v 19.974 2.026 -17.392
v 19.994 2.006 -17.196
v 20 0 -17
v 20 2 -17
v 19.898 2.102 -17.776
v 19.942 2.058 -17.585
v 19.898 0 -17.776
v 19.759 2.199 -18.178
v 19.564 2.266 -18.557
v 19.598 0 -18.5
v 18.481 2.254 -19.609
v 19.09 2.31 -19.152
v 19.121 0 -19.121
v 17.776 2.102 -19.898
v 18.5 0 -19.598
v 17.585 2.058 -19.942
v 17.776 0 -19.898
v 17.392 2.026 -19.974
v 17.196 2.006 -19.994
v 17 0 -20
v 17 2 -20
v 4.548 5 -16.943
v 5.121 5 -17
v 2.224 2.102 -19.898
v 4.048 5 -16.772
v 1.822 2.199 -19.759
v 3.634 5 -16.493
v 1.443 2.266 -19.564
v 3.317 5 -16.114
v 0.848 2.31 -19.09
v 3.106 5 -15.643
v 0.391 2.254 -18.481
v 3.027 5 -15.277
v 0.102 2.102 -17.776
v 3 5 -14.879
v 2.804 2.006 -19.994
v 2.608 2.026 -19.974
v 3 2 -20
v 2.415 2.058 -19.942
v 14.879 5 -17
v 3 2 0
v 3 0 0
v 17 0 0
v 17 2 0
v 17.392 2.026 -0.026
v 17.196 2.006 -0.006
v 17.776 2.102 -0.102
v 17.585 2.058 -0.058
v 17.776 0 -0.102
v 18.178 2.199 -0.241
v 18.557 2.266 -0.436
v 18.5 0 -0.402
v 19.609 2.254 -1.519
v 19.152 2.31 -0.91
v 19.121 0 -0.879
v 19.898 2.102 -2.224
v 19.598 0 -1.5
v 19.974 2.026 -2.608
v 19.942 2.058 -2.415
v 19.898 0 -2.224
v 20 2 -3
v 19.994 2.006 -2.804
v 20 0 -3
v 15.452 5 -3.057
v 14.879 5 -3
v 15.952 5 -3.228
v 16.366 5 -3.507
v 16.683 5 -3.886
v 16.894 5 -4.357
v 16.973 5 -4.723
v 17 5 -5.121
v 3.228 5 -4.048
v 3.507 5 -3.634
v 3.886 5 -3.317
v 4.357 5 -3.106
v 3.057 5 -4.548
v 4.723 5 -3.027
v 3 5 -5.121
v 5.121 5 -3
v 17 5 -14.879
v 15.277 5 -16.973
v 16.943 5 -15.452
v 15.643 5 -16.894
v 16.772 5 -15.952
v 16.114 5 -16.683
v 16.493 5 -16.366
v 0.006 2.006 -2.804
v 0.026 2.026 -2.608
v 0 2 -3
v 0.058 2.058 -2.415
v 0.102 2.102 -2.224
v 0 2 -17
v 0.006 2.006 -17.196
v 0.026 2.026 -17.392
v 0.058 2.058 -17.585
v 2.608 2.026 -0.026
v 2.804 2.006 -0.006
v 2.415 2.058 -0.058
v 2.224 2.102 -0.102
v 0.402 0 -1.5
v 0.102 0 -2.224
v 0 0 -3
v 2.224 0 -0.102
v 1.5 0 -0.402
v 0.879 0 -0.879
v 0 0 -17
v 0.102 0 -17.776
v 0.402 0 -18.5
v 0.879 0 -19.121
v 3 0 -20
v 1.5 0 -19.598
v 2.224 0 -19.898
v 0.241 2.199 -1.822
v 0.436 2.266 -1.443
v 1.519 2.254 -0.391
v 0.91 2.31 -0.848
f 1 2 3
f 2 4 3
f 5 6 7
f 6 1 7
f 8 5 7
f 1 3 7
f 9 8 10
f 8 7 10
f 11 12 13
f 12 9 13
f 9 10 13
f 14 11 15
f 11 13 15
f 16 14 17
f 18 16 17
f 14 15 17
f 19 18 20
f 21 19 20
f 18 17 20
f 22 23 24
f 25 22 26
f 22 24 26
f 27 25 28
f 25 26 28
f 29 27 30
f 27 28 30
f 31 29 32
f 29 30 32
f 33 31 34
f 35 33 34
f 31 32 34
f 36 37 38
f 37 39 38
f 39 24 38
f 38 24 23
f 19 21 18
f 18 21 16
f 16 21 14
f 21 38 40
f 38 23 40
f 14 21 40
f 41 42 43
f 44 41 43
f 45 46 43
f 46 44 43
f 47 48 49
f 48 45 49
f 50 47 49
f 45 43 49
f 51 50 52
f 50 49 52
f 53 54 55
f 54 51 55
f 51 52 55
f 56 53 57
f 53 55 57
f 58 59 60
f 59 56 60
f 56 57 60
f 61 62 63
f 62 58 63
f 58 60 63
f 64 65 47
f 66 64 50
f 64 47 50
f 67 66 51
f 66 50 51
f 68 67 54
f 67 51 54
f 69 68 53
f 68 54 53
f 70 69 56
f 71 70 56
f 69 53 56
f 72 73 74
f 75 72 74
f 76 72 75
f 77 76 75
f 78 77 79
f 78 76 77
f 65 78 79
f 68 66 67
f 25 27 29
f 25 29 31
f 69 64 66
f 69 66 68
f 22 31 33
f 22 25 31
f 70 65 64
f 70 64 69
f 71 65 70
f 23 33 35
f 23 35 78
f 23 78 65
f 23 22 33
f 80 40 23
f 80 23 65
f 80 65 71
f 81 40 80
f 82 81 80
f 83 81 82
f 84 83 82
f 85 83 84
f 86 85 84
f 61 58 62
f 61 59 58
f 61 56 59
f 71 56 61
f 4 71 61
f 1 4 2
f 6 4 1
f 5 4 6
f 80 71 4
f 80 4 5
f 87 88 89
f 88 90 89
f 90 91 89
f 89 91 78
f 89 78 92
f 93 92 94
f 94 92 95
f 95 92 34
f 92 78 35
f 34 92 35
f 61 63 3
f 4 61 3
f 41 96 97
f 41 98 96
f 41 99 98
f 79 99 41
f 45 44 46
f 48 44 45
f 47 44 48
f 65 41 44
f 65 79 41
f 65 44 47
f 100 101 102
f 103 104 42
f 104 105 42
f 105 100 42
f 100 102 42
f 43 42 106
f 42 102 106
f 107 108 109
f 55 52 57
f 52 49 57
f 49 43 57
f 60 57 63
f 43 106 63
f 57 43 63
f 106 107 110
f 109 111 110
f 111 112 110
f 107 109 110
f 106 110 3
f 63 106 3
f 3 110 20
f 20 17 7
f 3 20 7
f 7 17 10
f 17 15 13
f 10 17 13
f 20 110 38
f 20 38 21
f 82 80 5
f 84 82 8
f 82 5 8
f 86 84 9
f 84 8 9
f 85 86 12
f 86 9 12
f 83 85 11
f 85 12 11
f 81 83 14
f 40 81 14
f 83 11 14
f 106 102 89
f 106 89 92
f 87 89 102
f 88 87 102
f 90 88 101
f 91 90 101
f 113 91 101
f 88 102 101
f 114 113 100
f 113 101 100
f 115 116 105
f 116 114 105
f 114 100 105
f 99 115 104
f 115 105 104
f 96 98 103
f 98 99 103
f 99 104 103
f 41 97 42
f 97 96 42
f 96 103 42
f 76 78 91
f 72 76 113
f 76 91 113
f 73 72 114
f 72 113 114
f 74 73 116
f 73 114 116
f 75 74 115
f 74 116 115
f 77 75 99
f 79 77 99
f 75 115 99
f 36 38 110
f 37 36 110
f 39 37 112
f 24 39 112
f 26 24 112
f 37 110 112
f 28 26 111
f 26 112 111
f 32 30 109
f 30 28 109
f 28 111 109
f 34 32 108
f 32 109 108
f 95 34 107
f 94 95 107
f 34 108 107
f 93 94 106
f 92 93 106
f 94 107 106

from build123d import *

# Parameters (mm, degrees)
SKETCH1_W           = 20
SKETCH1_H           = 20
BOSS_EXTRUDE1_DEPTH = 5
CHAMFER1_SIZE       = 3
FILLET1_R           = 3


with BuildPart() as part:
    # Sketch1 → Boss-Extrude1 (new body)
    with BuildSketch(Plane(origin=(0, 0, 0), x_dir=(1, 0, 0), z_dir=(0, 1, 0))):
        with Locations((10, 10)):
            Rectangle(SKETCH1_W, SKETCH1_H)
    extrude(amount=BOSS_EXTRUDE1_DEPTH)

    # Chamfer1
    chamfer1_edges = [part.edges().sort_by_distance(p)[0] for p in [
        (10, 5, -20),
        (0, 5, -10),
        (10, 5, 0),
        (20, 5, -10),
    ]]
    chamfer(chamfer1_edges, length=CHAMFER1_SIZE)

    # Fillet1
    # the kernel refuses this fillet: 3 mm, written as the material it takes off along each edge
    with BuildSketch(Plane(origin=(0, -7.5, 0), x_dir=(0, 0, -1), z_dir=(0, 1, 0)), Plane(origin=(0, -7.5, -20), x_dir=(1, 0, 0), z_dir=(0, 1, 0))) as fillet1_piece_1:
        with BuildLine():
            CenterArc((FILLET1_R, -FILLET1_R), FILLET1_R, 90, 90)
            Line((0, -FILLET1_R), (0, 0))
            Line((0, 0), (FILLET1_R, 0))
        make_face()
    extrude(amount=17, mode=Mode.SUBTRACT)
    with BuildSketch(Plane(origin=(20, -7.5, -20), x_dir=(-1, 0, 0), z_dir=(0, 1, 0)), Plane(origin=(20, -7.5, 0), x_dir=(0, 0, -1), z_dir=(0, 1, 0))) as fillet1_piece_2:
        with BuildLine():
            CenterArc((FILLET1_R, FILLET1_R), FILLET1_R, 180, 90)
            Line((0, FILLET1_R), (0, 0))
            Line((0, 0), (FILLET1_R, 0))
        make_face()
    extrude(amount=17, mode=Mode.SUBTRACT)
    with BuildSketch(Plane(origin=(22.5, -0.5, -22.5), x_dir=(-0.8164965809277263, -0.4082482904638636, -0.408248290463862), z_dir=(-0.5773502691896255, 0.577350269189626, 0.577350269189626)), Plane(origin=(22.5, -0.5, 2.5), x_dir=(0.4082482904638631, -0.4082482904638628, -0.8164965809277261), z_dir=(-0.5773502691896261, 0.5773502691896256, -0.5773502691896256))) as fillet1_piece_3:
        with BuildLine():
            CenterArc((FILLET1_R * 0.57735026919, FILLET1_R), FILLET1_R, 210, 60)
            Line((-FILLET1_R * 0.288675134595, FILLET1_R * 0.5), (0, 0))
            Line((0, 0), (FILLET1_R * 0.57735026919, 0))
        make_face()
    extrude(amount=13.856406461, mode=Mode.SUBTRACT)
    with BuildSketch(Plane(origin=(-2.5, -0.5, -22.5), x_dir=(0.8164965809277259, -0.40824829046386324, -0.40824829046386274), z_dir=(0.5773502691896258, 0.5773502691896258, 0.5773502691896258)), Plane(origin=(-2.5, -0.5, 2.5), x_dir=(-0.40824829046386274, -0.4082482904638633, -0.816496580927726), z_dir=(0.5773502691896258, 0.5773502691896258, -0.5773502691896258))) as fillet1_piece_4:
        with BuildLine():
            CenterArc((FILLET1_R * 0.57735026919, -FILLET1_R), FILLET1_R, 90, 60)
            Line((-FILLET1_R * 0.288675134595, -FILLET1_R * 0.5), (0, 0))
            Line((0, 0), (FILLET1_R * 0.57735026919, 0))
        make_face()
    extrude(amount=13.856406461, mode=Mode.SUBTRACT)


solid = part.part
